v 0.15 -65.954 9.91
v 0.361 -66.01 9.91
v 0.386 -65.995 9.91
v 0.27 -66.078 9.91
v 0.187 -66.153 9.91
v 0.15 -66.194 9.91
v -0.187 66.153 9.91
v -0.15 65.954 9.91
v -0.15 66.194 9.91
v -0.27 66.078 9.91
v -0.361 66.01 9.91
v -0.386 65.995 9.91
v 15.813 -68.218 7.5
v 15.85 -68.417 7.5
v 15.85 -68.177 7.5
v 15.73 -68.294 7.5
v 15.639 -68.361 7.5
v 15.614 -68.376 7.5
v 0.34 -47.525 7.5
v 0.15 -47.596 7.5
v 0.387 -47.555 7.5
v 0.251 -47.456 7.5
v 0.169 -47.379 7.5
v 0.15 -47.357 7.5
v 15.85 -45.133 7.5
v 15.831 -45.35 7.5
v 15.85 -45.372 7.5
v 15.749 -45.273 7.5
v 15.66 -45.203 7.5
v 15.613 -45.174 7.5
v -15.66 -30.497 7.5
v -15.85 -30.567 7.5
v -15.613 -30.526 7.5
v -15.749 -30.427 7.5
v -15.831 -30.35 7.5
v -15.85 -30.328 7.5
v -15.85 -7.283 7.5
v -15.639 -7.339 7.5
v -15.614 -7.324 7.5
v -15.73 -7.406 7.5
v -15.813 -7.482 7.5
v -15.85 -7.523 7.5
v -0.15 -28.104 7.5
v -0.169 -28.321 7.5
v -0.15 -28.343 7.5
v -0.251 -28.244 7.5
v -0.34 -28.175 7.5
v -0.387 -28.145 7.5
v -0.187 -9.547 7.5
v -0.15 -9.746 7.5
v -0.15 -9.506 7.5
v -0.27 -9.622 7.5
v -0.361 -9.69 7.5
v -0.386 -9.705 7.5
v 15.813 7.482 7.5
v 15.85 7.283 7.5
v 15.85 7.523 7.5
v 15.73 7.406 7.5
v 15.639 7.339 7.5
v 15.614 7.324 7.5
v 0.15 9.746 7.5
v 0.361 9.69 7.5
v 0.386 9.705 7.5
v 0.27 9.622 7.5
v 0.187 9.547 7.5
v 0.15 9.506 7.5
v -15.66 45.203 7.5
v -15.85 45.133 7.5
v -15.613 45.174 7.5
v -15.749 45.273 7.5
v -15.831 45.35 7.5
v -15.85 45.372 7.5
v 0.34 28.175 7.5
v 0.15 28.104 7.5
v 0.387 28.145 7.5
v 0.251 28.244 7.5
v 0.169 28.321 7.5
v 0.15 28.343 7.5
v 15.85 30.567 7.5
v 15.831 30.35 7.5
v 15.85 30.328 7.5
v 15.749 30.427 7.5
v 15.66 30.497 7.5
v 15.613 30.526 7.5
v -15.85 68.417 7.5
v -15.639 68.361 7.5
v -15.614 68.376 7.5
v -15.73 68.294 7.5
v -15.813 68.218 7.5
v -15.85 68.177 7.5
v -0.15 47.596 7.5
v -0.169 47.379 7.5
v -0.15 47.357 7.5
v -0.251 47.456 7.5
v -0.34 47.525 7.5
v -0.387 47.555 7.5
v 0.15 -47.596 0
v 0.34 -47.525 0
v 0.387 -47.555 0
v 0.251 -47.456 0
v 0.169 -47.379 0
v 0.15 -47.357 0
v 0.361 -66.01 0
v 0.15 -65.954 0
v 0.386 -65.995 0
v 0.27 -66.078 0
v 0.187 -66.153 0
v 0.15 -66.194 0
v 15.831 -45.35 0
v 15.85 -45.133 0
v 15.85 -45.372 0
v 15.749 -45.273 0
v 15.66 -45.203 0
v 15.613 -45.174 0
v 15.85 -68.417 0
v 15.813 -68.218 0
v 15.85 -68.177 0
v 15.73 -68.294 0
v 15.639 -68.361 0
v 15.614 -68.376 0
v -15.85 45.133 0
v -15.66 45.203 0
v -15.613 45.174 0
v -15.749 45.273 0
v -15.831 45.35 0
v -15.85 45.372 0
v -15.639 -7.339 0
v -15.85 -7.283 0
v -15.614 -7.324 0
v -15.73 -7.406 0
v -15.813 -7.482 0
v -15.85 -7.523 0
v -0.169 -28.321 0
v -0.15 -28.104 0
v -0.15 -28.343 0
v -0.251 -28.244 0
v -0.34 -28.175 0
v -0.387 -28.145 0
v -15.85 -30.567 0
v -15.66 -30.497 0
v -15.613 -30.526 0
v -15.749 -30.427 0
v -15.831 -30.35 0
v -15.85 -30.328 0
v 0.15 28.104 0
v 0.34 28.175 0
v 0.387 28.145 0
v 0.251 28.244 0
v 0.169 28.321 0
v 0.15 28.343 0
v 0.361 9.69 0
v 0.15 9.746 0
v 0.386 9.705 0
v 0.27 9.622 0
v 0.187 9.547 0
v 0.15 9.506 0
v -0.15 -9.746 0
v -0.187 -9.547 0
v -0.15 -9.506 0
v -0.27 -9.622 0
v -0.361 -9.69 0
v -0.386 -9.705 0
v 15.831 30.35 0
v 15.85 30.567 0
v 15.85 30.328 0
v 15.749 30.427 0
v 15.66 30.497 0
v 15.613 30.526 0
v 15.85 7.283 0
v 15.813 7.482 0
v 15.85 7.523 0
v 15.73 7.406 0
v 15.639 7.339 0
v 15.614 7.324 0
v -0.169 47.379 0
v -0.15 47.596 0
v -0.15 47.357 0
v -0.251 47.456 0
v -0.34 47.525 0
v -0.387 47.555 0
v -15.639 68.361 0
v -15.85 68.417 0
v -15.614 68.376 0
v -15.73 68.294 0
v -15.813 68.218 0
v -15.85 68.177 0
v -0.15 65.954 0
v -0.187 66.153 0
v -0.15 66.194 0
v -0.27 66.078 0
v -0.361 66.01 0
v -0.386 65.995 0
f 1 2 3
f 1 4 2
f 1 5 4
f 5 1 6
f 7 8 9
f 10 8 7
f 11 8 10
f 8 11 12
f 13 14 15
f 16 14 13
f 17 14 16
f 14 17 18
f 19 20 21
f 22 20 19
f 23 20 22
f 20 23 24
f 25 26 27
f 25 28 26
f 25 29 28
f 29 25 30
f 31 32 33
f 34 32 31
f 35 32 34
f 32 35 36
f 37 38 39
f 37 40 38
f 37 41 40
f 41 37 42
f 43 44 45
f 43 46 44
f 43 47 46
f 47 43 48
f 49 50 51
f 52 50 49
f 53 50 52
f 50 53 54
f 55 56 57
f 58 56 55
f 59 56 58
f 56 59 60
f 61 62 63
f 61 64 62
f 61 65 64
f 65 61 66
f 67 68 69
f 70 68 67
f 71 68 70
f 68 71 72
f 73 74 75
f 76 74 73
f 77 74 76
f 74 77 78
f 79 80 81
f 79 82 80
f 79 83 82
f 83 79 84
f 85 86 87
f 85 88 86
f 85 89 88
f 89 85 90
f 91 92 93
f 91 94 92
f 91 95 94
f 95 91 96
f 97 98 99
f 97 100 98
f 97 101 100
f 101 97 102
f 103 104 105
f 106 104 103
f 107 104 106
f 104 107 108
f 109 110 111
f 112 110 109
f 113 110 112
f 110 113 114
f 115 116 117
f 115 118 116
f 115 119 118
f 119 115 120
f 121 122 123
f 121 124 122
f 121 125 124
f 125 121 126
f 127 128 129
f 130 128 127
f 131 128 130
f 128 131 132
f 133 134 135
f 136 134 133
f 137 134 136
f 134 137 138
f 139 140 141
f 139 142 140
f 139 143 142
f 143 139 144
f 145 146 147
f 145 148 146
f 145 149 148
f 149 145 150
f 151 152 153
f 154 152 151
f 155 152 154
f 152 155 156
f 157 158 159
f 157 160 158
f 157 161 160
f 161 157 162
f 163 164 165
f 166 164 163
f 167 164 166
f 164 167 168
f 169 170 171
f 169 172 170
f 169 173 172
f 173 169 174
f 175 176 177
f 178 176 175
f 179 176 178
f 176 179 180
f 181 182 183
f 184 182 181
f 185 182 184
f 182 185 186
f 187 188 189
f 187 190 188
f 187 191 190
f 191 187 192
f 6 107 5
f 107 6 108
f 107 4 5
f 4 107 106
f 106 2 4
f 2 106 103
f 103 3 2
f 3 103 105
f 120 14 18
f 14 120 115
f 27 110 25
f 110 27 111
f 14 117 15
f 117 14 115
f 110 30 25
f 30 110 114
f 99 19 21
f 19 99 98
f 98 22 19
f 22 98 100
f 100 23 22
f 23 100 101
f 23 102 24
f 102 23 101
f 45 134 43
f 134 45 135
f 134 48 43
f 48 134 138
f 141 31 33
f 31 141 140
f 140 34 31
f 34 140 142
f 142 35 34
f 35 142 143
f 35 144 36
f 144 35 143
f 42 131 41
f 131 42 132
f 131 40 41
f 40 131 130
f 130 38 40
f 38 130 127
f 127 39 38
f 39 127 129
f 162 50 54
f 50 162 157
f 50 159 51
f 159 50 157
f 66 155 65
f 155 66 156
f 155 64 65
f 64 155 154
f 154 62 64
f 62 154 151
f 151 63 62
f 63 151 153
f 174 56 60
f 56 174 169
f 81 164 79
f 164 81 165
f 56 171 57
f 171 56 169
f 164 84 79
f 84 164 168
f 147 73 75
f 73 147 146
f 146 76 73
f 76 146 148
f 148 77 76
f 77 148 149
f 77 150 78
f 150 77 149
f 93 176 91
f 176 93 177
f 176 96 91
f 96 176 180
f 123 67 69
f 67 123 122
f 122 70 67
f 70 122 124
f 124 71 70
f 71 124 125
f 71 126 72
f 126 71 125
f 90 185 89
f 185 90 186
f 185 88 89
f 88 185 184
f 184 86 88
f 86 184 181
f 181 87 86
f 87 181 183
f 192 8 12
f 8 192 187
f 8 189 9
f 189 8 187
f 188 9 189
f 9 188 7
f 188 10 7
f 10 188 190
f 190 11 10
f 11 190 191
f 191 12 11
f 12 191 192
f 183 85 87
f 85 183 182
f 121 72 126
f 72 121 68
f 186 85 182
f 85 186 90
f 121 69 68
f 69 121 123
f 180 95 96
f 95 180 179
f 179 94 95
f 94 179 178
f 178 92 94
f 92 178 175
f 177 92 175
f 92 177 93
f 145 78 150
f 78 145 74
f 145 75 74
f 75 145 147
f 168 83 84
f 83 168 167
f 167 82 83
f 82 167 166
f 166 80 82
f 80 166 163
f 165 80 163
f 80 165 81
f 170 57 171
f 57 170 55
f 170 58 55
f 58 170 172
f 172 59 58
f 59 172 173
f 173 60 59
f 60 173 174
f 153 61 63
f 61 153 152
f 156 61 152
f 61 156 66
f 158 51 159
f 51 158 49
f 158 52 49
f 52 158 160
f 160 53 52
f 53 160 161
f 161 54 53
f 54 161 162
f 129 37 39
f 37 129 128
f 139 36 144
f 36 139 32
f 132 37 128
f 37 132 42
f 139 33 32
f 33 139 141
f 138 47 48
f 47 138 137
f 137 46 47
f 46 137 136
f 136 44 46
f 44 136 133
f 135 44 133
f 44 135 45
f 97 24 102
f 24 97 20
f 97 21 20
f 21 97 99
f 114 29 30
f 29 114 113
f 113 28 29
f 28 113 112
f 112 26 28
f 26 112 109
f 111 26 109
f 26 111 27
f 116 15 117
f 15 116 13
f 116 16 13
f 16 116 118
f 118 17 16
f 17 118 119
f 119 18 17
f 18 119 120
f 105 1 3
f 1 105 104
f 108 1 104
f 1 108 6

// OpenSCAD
// file: seat_board_lib.scad
// =====================================================================
//  RAD passenger seat - shared board geometry (no top-level object)
//  Included by seat_board.scad (one piece) and seat_board_split.scad
//  (two interlocking halves).
//  All dimensions in millimetres.
// =====================================================================

/* [Seat footprint] */
seat_len      = 11.5 * 25.4;   // 292.1  cushion overall length
seat_wid      = 6.0  * 25.4;   // 152.4  cushion overall width
side_clear    = 0.5;           // slip-fit gap per side inside the cover
corner_r      = 18;            // plan-view corner radius
edge_chamfer  = 0.8;           // chamfer on top and bottom perimeters

/* [Bolt pattern - centred] */
pitch_x       = 223;           // eye-to-eye, along length
pitch_y       = 110;           // eye-to-eye, across width
bolt_hole_d   = 6.8;           // M6 clearance
hex_af        = 10.0;          // M6 hex head across flats
hex_fit       = 0.6;           // total clearance in hex trap (print tolerance)
hex_depth     = 5.5;           // trap depth from the top of the boss
hex_lead      = 0.8;           // lead-in chamfer at trap mouth
hex_rot       = 0;             // 0 deg = flats parallel to X axis

/* [Height budget] */
// total_height is the only dimension the cover cares about. Everything
// above the plate (ribs, rim, bolt pads) is packed into the leftover.
total_height  = 10.0;
thickness     = 7.5;           // plate; the remainder becomes rib depth

/* [Reinforcement] */
reinforce     = true;          // bosses + rib grid on the cushion face
boss_d        = 34;            // pad diameter at each bolt
boss_fillet   = 2.5;           // 45 deg blend into the plate
rib_w         = 6.0;           // rib width at the base
rib_top_w     = 3.5;           // rib width at the top
rim           = true;          // closed perimeter rib = torsion box
rim_inset     = 8.0;           // board edge to rim outer face
rim_w         = 6.0;           // rim width
rib_inset     = 6.0;           // rib end clearance when the rim is off

rib_h         = total_height - thickness;
boss_h        = rib_h;
rib_reach     = rim ? rim_inset + rim_w / 2 : rib_inset;

// ---------------------------------------------------------------------
board_len = seat_len - 2 * side_clear;
board_wid = seat_wid - 2 * side_clear;
hex_d     = (hex_af + hex_fit) / cos(30);   // across-corners of trap
hex_top   = thickness + (reinforce ? boss_h : 0);

$fn = 64;

// ---------------------------------------------------------------------
module rrect(l, w, r) {
    offset(r = r, $fn = 128) square([l - 2 * r, w - 2 * r], center = true);
}

// plate with chamfered top and bottom perimeter
module slab(l, w, r, h, c) {
    hull() {
        linear_extrude(0.01)          offset(delta = -c) rrect(l, w, r);
        translate([0, 0, c])          linear_extrude(0.01) rrect(l, w, r);
        translate([0, 0, h - c])      linear_extrude(0.01) rrect(l, w, r);
        translate([0, 0, h - 0.01])   linear_extrude(0.01) offset(delta = -c) rrect(l, w, r);
    }
}

// conical-skirted pad around a bolt station
module boss() {
    // keep the fillet control below the boss top so the hull cannot overshoot
    // the height envelope when boss_h equals boss_fillet
    fillet = min(boss_fillet, boss_h - 0.1);
    hull() {
        translate([0, 0, thickness - 0.01])
            cylinder(d = boss_d + 2 * fillet, h = 0.02, $fn = 96);
        translate([0, 0, thickness + fillet])
            cylinder(d = boss_d, h = 0.01, $fn = 96);
        translate([0, 0, hex_top - 0.01])
            cylinder(d = boss_d, h = 0.01, $fn = 96);
    }
}

// one tapered rib, length along local X, centred on local origin.
// ztop is nudged per rib family so no two top faces end up coplanar.
module rib(len, ztop) {
    hull() {
        translate([0, 0, thickness - 0.01])
            cube([len, rib_w, 0.02], center = true);
        translate([0, 0, ztop - 0.01])
            cube([len, rib_top_w, 0.02], center = true);
    }
}

// closed loop around the perimeter - ties every rib into a torsion box
module rim_ring() {
    z0 = thickness - 0.01;
    z1 = hex_top - 0.09;
    translate([0, 0, z0])
        difference() {
            linear_extrude(z1 - z0)
                rrect(board_len - 2 * rim_inset, board_wid - 2 * rim_inset,
                      max(0.5, corner_r - rim_inset));
            translate([0, 0, -1])
                linear_extrude(z1 - z0 + 2)
                    rrect(board_len - 2 * rim_inset - 2 * rim_w,
                          board_wid - 2 * rim_inset - 2 * rim_w,
                          max(0.5, corner_r - rim_inset - rim_w));
        }
}

module bolt_station() {
    translate([0, 0, -1])
        cylinder(d = bolt_hole_d, h = hex_top + 3, $fn = 64);

    translate([0, 0, hex_top - hex_depth])
        cylinder(d = hex_d, h = hex_depth + 1, $fn = 6);

    translate([0, 0, hex_top - hex_lead])
        hull() {
            cylinder(d = hex_d, h = 0.01, $fn = 6);
            translate([0, 0, hex_lead])
                cylinder(d = hex_d + 2 * hex_lead, h = 0.01, $fn = 6);
        }
}

// cross_ribs is exposed so the split version can move the centre ribs
// clear of the interlocking seam.
module seat_board(cross_ribs = [-pitch_x / 2, 0, pitch_x / 2]) {
    difference() {
        union() {
            slab(board_len, board_wid, corner_r, thickness, edge_chamfer);

            if (reinforce) {
                for (sx = [-1, 1], sy = [-1, 1])
                    translate([sx * pitch_x / 2, sy * pitch_y / 2, 0])
                        boss();

                if (rim)
                    rim_ring();

                for (y = [-pitch_y / 2, 0, pitch_y / 2])
                    translate([0, y, 0])
                        rib(board_len - 2 * rib_reach, hex_top - 0.05);

                for (x = cross_ribs)
                    translate([x, 0, 0])
                        rotate([0, 0, 90])
                            rib(board_wid - 2 * rib_reach, hex_top - 0.12);
            }
        }

        for (sx = [-1, 1], sy = [-1, 1])
            translate([sx * pitch_x / 2, sy * pitch_y / 2, 0])
                rotate([0, 0, hex_rot])
                    bolt_station();
    }
}
// file: seat_board_split.scad
// =====================================================================
//  RAD passenger seat - two-piece board for a 220 x 220 bed
//
//  Split at the board's centre line, x = 0. The seam is a dovetail comb:
//  four trapezoidal teeth with a 10 deg undercut, so the halves key
//  together mechanically and cannot pull apart in X. The pattern is odd
//  about y = 0, which makes the two halves IDENTICAL: print this file
//  twice and turn one part 180 deg about Z to mate it.
//
//  Assembly is a straight vertical drop - the seam is a constant-Z
//  profile, so both halves print flat with no supports and the joint
//  faces come off the printer square.
//
//  All dimensions in millimetres.
// =====================================================================

include <seat_board_lib.scad>

/* [Interlock] */
seam_depth    = 16.0;    // tooth reach either side of x = 0
seam_angle    = 10;      // dovetail undercut, degrees
seam_teeth    = 4;       // even number, so halves are identical
seam_root_w   = 18.0;    // tooth width where it meets the seam line
seam_fillet   = 1.0;     // rounds the tooth roots (stress relief)
seam_gap      = 0.15;    // clearance per side -> 0.30 mm glue line

// Move the inner cross ribs off the seam so the joint runs through a
// clean flat band instead of splitting a rib down its centre.
split_cross_ribs = [-pitch_x / 2, -25, 25, pitch_x / 2];

// ---------------------------------------------------------------------
seam_pitch = board_wid / seam_teeth;
root_half  = seam_root_w / 2;
tip_half   = root_half + seam_depth * tan(seam_angle);
seam_top   = thickness + (reinforce ? boss_h : 0);

centres = [for (i = [0 : seam_teeth - 1])
              (i - (seam_teeth - 1) / 2) * seam_pitch];
dirs    = [for (i = [0 : seam_teeth - 1]) (i % 2 == 0) ? 1 : -1];

function tooth_pts(yc, d) = [
    [0,       yc - root_half],
    [d * seam_depth, yc - tip_half],
    [d * seam_depth, yc + tip_half],
    [0,       yc + root_half]
];

seam_points = concat(
    [[-400, -200], [0, -200]],
    [for (i = [0 : seam_teeth - 1]) each tooth_pts(centres[i], dirs[i])],
    [[0, 200], [-400, 200]]
);

module seam_profile() {
    polygon(points = seam_points);
}

// closing rounds the concave tooth roots; the delta offset leaves the
// glue clearance on every joint face.
module piece_profile() {
    offset(delta = -seam_gap)
        offset(r = -seam_fillet)
            offset(r = seam_fillet)
                seam_profile();
}

// ---------------------------------------------------------------------
module half() {
    intersection() {
        seat_board(cross_ribs = split_cross_ribs);
        linear_extrude(seam_top + 4) piece_profile();
    }
}

show = "half";   // [half, pair, exploded, seam]

if (show == "half") {
    half();
} else if (show == "seam") {
    piece_profile();
} else if (show == "pair") {
    half();
    rotate([0, 0, 180]) half();
} else {
    color("SteelBlue") half();
    color("Goldenrod") translate([45, 0, 0]) rotate([0, 0, 180]) half();
}
// main file
// QA: does the mirrored half interfere with the original?
use <seat_board_split.scad>

intersection() {
    half();
    rotate([0, 0, 180]) half();
}
